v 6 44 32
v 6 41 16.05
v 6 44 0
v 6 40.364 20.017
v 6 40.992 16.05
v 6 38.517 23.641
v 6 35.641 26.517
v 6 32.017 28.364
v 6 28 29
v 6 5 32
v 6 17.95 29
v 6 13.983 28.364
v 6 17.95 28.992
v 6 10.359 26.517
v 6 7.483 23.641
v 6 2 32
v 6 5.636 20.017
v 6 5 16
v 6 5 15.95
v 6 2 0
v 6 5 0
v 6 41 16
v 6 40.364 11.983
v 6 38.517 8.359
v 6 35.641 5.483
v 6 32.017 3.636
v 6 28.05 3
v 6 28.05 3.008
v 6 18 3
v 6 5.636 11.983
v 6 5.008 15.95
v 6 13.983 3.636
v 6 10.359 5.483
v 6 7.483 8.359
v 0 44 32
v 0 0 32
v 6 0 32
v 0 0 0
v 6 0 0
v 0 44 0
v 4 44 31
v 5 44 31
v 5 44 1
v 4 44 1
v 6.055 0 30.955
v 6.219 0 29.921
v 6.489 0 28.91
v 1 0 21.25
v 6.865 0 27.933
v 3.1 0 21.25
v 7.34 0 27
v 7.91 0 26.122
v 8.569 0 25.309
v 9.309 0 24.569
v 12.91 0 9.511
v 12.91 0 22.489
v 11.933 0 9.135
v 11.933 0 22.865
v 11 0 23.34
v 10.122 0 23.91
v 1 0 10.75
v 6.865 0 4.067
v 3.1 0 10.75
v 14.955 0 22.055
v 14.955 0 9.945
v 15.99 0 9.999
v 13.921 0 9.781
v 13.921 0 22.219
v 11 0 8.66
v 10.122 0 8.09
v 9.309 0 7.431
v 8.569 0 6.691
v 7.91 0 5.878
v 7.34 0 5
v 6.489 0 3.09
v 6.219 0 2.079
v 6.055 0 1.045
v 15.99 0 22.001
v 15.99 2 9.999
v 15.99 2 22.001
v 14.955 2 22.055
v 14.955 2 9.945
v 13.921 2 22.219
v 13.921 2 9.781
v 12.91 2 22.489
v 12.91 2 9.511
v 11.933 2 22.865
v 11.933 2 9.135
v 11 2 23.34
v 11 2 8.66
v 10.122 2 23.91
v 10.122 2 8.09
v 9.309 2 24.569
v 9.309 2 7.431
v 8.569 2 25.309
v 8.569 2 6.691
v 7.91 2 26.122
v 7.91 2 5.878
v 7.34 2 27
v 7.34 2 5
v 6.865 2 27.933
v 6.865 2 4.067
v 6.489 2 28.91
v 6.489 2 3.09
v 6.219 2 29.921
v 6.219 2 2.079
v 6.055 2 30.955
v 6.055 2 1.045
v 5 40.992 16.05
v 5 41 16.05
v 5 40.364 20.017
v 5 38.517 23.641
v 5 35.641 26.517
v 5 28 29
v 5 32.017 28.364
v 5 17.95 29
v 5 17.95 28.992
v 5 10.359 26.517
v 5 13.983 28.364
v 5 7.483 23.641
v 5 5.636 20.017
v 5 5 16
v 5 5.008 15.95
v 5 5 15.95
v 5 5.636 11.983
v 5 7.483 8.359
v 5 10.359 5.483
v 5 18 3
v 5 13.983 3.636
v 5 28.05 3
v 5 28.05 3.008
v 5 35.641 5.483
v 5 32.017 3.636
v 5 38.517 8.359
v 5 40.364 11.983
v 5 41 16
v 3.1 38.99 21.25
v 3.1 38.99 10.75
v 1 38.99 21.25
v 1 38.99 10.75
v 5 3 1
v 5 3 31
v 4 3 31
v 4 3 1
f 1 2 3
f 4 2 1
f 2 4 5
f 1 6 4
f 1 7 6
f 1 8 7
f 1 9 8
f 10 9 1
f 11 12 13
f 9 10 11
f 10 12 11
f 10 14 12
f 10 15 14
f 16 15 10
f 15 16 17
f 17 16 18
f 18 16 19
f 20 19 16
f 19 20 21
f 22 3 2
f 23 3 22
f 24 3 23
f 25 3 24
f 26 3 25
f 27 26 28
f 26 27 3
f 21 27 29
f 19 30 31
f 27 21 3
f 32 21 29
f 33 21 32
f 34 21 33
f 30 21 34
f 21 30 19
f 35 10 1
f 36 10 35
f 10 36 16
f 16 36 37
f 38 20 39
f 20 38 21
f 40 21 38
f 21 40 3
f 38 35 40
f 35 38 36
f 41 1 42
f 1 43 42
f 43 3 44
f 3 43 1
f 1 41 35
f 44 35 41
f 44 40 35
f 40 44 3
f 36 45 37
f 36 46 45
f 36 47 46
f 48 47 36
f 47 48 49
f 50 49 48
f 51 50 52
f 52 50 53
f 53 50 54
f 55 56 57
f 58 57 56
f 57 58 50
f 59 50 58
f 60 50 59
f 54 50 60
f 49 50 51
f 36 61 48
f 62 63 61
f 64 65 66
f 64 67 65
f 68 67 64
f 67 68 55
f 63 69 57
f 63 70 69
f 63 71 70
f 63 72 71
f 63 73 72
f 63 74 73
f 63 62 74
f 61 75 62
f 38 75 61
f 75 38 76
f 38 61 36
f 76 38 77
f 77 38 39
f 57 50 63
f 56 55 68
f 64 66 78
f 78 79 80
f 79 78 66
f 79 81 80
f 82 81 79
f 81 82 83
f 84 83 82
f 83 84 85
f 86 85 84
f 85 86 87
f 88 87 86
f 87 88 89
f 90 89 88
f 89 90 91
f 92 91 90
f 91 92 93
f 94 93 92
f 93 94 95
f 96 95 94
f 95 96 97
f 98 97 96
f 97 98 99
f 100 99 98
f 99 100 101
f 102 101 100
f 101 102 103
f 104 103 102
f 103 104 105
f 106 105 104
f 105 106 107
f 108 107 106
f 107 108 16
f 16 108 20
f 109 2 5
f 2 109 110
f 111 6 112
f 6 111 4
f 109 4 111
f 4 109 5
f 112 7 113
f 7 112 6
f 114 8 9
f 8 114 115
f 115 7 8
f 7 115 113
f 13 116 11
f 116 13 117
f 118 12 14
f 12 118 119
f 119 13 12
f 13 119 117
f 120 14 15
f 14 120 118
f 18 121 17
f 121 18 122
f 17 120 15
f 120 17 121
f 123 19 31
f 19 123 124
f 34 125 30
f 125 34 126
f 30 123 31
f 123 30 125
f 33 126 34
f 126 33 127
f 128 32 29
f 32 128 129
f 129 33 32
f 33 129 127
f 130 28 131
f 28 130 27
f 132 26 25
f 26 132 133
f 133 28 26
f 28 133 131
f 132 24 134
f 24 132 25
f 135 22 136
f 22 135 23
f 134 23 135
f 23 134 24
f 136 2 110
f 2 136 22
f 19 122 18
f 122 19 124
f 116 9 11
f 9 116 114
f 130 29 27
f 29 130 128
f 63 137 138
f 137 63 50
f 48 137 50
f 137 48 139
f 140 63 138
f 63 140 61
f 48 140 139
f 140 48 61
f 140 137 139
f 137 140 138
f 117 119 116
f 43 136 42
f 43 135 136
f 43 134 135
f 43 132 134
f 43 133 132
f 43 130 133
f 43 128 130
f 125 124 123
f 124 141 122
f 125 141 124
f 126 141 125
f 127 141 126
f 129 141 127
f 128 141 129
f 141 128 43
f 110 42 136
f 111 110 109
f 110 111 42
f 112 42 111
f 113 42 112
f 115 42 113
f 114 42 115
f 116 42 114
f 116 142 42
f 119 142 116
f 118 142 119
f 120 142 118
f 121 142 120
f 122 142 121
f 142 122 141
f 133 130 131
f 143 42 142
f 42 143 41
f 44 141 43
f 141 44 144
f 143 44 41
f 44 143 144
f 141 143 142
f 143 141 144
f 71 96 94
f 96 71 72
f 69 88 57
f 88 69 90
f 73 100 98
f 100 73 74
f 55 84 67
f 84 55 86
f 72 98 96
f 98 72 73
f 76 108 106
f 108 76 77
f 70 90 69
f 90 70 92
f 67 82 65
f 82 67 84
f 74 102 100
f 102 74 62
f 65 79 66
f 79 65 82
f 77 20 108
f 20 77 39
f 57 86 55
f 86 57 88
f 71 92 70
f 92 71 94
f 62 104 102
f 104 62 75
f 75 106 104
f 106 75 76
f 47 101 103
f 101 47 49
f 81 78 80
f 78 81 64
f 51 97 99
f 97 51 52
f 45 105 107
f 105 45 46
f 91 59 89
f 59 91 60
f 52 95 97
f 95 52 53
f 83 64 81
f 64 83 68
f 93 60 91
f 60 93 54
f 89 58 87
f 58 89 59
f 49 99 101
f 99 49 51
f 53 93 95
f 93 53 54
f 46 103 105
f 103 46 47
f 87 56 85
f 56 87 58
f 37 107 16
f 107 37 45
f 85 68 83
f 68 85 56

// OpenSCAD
$fa=6;
$fs=0.1;
EPS=0.01;

PictureHeight=30;
PictureWidth=40;

Width=6;
MagnetThickness=2.1;
MagnetHeight=10.5;
HandleWidth=2;
HandleHeight=10;


Height=PictureHeight+2;
Depth=PictureWidth+HandleWidth+2;


PictureMagnet();


module window() {
    W=PictureWidth-4;
    H=PictureHeight-4;

    translate([Width-1, HandleWidth+3, 3])
      rotate(90,[1,0,0]) rotate(90, [0,1,0]) translate([W/2,H/2,10/2-EPS])
      roundCornersCube(W,H,10,13);
}


module PictureMagnet() {
  difference() {
    union() {
        cube(size=[Width,Depth,Height]);
        translate([Width-EPS,0,0])
            cube(size=[HandleHeight,HandleWidth,Height]);
    }

    translate([1, -EPS, (Height-MagnetHeight)/2])
        cube(size=[MagnetThickness,Depth-5,MagnetHeight]);

    translate([Width-2, HandleWidth+1, 1])
        cube(size=[1, PictureWidth+10, PictureHeight]);

    window();


    // Einrundung
    translate([HandleHeight+Width,0,0]) rotate(90, [1,0,0])
        cylinder(r=HandleHeight, h=10, center=true);
    translate([HandleHeight+Width,0,Height]) rotate(90, [1,0,0])
        cylinder(r=HandleHeight, h=10, center=true);
  }
}


/*
http://codeviewer.org/view/code:1b36 
Copyright (C) 2011 Sergio Vilches
This program is free software: you can redistribute it and/or modify it under the terms of the GNU General Public License as published by the Free Software Foundation, either version 3 of the License, or (at your option) any later version.
This program is distributed in the hope that it will be useful, but WITHOUT ANY WARRANTY; without even the implied warranty of MERCHANTABILITY or FITNESS FOR A PARTICULAR PURPOSE. See the GNU General Public License for more details. You should have received a copy of the GNU General Public License along with this program. If not, see <http://www.gnu.org/licenses/>.
Contact: s.vilches.e@gmail.com


    ----------------------------------------------------------- 
                 Round Corners Cube (Extruded)                
      roundCornersCube(x,y,z,r) Where:                        
         - x = Xdir width                                     
         - y = Ydir width                                     
         - z = Height of the cube                             
         - r = Rounding radious                               
                                                              
      Example: roundCornerCube(10,10,2,1);                    
     *Some times it's needed to use F6 to see good results!   
 	 ----------------------------------------------------------- 
*/
// Test it!
// roundCornersCube(10,5,2,1);


module createMeniscus(h,radius) // This module creates the shape that needs to be substracted from a cube to make its corners rounded.
difference(){        //This shape is basicly the difference between a quarter of cylinder and a cube
   translate([radius/2+0.1,radius/2+0.1,0]){
      cube([radius+0.2,radius+0.1,h+0.2],center=true);         // All that 0.x numbers are to avoid "ghost boundaries" when substracting
   }

   cylinder(h=h+0.2,r=radius,$fn = 20,center=true);
}


module roundCornersCube(x,y,z,r)  // Now we just substract the shape we have created in the four corners
difference(){
   cube([x,y,z], center=true);

translate([x/2-r,y/2-r]){  // We move to the first corner (x,y)
      rotate(0){  
         createMeniscus(z,r); // And substract the meniscus
      }
   }
   translate([-x/2+r,y/2-r]){ // To the second corner (-x,y)
      rotate(90){
         createMeniscus(z,r); // But this time we have to rotate the meniscus 90 deg
      }
   }
      translate([-x/2+r,-y/2+r]){ // ... 
      rotate(180){
         createMeniscus(z,r);
      }
   }
      translate([x/2-r,-y/2+r]){
      rotate(270){
         createMeniscus(z,r);
      }
   }
}
